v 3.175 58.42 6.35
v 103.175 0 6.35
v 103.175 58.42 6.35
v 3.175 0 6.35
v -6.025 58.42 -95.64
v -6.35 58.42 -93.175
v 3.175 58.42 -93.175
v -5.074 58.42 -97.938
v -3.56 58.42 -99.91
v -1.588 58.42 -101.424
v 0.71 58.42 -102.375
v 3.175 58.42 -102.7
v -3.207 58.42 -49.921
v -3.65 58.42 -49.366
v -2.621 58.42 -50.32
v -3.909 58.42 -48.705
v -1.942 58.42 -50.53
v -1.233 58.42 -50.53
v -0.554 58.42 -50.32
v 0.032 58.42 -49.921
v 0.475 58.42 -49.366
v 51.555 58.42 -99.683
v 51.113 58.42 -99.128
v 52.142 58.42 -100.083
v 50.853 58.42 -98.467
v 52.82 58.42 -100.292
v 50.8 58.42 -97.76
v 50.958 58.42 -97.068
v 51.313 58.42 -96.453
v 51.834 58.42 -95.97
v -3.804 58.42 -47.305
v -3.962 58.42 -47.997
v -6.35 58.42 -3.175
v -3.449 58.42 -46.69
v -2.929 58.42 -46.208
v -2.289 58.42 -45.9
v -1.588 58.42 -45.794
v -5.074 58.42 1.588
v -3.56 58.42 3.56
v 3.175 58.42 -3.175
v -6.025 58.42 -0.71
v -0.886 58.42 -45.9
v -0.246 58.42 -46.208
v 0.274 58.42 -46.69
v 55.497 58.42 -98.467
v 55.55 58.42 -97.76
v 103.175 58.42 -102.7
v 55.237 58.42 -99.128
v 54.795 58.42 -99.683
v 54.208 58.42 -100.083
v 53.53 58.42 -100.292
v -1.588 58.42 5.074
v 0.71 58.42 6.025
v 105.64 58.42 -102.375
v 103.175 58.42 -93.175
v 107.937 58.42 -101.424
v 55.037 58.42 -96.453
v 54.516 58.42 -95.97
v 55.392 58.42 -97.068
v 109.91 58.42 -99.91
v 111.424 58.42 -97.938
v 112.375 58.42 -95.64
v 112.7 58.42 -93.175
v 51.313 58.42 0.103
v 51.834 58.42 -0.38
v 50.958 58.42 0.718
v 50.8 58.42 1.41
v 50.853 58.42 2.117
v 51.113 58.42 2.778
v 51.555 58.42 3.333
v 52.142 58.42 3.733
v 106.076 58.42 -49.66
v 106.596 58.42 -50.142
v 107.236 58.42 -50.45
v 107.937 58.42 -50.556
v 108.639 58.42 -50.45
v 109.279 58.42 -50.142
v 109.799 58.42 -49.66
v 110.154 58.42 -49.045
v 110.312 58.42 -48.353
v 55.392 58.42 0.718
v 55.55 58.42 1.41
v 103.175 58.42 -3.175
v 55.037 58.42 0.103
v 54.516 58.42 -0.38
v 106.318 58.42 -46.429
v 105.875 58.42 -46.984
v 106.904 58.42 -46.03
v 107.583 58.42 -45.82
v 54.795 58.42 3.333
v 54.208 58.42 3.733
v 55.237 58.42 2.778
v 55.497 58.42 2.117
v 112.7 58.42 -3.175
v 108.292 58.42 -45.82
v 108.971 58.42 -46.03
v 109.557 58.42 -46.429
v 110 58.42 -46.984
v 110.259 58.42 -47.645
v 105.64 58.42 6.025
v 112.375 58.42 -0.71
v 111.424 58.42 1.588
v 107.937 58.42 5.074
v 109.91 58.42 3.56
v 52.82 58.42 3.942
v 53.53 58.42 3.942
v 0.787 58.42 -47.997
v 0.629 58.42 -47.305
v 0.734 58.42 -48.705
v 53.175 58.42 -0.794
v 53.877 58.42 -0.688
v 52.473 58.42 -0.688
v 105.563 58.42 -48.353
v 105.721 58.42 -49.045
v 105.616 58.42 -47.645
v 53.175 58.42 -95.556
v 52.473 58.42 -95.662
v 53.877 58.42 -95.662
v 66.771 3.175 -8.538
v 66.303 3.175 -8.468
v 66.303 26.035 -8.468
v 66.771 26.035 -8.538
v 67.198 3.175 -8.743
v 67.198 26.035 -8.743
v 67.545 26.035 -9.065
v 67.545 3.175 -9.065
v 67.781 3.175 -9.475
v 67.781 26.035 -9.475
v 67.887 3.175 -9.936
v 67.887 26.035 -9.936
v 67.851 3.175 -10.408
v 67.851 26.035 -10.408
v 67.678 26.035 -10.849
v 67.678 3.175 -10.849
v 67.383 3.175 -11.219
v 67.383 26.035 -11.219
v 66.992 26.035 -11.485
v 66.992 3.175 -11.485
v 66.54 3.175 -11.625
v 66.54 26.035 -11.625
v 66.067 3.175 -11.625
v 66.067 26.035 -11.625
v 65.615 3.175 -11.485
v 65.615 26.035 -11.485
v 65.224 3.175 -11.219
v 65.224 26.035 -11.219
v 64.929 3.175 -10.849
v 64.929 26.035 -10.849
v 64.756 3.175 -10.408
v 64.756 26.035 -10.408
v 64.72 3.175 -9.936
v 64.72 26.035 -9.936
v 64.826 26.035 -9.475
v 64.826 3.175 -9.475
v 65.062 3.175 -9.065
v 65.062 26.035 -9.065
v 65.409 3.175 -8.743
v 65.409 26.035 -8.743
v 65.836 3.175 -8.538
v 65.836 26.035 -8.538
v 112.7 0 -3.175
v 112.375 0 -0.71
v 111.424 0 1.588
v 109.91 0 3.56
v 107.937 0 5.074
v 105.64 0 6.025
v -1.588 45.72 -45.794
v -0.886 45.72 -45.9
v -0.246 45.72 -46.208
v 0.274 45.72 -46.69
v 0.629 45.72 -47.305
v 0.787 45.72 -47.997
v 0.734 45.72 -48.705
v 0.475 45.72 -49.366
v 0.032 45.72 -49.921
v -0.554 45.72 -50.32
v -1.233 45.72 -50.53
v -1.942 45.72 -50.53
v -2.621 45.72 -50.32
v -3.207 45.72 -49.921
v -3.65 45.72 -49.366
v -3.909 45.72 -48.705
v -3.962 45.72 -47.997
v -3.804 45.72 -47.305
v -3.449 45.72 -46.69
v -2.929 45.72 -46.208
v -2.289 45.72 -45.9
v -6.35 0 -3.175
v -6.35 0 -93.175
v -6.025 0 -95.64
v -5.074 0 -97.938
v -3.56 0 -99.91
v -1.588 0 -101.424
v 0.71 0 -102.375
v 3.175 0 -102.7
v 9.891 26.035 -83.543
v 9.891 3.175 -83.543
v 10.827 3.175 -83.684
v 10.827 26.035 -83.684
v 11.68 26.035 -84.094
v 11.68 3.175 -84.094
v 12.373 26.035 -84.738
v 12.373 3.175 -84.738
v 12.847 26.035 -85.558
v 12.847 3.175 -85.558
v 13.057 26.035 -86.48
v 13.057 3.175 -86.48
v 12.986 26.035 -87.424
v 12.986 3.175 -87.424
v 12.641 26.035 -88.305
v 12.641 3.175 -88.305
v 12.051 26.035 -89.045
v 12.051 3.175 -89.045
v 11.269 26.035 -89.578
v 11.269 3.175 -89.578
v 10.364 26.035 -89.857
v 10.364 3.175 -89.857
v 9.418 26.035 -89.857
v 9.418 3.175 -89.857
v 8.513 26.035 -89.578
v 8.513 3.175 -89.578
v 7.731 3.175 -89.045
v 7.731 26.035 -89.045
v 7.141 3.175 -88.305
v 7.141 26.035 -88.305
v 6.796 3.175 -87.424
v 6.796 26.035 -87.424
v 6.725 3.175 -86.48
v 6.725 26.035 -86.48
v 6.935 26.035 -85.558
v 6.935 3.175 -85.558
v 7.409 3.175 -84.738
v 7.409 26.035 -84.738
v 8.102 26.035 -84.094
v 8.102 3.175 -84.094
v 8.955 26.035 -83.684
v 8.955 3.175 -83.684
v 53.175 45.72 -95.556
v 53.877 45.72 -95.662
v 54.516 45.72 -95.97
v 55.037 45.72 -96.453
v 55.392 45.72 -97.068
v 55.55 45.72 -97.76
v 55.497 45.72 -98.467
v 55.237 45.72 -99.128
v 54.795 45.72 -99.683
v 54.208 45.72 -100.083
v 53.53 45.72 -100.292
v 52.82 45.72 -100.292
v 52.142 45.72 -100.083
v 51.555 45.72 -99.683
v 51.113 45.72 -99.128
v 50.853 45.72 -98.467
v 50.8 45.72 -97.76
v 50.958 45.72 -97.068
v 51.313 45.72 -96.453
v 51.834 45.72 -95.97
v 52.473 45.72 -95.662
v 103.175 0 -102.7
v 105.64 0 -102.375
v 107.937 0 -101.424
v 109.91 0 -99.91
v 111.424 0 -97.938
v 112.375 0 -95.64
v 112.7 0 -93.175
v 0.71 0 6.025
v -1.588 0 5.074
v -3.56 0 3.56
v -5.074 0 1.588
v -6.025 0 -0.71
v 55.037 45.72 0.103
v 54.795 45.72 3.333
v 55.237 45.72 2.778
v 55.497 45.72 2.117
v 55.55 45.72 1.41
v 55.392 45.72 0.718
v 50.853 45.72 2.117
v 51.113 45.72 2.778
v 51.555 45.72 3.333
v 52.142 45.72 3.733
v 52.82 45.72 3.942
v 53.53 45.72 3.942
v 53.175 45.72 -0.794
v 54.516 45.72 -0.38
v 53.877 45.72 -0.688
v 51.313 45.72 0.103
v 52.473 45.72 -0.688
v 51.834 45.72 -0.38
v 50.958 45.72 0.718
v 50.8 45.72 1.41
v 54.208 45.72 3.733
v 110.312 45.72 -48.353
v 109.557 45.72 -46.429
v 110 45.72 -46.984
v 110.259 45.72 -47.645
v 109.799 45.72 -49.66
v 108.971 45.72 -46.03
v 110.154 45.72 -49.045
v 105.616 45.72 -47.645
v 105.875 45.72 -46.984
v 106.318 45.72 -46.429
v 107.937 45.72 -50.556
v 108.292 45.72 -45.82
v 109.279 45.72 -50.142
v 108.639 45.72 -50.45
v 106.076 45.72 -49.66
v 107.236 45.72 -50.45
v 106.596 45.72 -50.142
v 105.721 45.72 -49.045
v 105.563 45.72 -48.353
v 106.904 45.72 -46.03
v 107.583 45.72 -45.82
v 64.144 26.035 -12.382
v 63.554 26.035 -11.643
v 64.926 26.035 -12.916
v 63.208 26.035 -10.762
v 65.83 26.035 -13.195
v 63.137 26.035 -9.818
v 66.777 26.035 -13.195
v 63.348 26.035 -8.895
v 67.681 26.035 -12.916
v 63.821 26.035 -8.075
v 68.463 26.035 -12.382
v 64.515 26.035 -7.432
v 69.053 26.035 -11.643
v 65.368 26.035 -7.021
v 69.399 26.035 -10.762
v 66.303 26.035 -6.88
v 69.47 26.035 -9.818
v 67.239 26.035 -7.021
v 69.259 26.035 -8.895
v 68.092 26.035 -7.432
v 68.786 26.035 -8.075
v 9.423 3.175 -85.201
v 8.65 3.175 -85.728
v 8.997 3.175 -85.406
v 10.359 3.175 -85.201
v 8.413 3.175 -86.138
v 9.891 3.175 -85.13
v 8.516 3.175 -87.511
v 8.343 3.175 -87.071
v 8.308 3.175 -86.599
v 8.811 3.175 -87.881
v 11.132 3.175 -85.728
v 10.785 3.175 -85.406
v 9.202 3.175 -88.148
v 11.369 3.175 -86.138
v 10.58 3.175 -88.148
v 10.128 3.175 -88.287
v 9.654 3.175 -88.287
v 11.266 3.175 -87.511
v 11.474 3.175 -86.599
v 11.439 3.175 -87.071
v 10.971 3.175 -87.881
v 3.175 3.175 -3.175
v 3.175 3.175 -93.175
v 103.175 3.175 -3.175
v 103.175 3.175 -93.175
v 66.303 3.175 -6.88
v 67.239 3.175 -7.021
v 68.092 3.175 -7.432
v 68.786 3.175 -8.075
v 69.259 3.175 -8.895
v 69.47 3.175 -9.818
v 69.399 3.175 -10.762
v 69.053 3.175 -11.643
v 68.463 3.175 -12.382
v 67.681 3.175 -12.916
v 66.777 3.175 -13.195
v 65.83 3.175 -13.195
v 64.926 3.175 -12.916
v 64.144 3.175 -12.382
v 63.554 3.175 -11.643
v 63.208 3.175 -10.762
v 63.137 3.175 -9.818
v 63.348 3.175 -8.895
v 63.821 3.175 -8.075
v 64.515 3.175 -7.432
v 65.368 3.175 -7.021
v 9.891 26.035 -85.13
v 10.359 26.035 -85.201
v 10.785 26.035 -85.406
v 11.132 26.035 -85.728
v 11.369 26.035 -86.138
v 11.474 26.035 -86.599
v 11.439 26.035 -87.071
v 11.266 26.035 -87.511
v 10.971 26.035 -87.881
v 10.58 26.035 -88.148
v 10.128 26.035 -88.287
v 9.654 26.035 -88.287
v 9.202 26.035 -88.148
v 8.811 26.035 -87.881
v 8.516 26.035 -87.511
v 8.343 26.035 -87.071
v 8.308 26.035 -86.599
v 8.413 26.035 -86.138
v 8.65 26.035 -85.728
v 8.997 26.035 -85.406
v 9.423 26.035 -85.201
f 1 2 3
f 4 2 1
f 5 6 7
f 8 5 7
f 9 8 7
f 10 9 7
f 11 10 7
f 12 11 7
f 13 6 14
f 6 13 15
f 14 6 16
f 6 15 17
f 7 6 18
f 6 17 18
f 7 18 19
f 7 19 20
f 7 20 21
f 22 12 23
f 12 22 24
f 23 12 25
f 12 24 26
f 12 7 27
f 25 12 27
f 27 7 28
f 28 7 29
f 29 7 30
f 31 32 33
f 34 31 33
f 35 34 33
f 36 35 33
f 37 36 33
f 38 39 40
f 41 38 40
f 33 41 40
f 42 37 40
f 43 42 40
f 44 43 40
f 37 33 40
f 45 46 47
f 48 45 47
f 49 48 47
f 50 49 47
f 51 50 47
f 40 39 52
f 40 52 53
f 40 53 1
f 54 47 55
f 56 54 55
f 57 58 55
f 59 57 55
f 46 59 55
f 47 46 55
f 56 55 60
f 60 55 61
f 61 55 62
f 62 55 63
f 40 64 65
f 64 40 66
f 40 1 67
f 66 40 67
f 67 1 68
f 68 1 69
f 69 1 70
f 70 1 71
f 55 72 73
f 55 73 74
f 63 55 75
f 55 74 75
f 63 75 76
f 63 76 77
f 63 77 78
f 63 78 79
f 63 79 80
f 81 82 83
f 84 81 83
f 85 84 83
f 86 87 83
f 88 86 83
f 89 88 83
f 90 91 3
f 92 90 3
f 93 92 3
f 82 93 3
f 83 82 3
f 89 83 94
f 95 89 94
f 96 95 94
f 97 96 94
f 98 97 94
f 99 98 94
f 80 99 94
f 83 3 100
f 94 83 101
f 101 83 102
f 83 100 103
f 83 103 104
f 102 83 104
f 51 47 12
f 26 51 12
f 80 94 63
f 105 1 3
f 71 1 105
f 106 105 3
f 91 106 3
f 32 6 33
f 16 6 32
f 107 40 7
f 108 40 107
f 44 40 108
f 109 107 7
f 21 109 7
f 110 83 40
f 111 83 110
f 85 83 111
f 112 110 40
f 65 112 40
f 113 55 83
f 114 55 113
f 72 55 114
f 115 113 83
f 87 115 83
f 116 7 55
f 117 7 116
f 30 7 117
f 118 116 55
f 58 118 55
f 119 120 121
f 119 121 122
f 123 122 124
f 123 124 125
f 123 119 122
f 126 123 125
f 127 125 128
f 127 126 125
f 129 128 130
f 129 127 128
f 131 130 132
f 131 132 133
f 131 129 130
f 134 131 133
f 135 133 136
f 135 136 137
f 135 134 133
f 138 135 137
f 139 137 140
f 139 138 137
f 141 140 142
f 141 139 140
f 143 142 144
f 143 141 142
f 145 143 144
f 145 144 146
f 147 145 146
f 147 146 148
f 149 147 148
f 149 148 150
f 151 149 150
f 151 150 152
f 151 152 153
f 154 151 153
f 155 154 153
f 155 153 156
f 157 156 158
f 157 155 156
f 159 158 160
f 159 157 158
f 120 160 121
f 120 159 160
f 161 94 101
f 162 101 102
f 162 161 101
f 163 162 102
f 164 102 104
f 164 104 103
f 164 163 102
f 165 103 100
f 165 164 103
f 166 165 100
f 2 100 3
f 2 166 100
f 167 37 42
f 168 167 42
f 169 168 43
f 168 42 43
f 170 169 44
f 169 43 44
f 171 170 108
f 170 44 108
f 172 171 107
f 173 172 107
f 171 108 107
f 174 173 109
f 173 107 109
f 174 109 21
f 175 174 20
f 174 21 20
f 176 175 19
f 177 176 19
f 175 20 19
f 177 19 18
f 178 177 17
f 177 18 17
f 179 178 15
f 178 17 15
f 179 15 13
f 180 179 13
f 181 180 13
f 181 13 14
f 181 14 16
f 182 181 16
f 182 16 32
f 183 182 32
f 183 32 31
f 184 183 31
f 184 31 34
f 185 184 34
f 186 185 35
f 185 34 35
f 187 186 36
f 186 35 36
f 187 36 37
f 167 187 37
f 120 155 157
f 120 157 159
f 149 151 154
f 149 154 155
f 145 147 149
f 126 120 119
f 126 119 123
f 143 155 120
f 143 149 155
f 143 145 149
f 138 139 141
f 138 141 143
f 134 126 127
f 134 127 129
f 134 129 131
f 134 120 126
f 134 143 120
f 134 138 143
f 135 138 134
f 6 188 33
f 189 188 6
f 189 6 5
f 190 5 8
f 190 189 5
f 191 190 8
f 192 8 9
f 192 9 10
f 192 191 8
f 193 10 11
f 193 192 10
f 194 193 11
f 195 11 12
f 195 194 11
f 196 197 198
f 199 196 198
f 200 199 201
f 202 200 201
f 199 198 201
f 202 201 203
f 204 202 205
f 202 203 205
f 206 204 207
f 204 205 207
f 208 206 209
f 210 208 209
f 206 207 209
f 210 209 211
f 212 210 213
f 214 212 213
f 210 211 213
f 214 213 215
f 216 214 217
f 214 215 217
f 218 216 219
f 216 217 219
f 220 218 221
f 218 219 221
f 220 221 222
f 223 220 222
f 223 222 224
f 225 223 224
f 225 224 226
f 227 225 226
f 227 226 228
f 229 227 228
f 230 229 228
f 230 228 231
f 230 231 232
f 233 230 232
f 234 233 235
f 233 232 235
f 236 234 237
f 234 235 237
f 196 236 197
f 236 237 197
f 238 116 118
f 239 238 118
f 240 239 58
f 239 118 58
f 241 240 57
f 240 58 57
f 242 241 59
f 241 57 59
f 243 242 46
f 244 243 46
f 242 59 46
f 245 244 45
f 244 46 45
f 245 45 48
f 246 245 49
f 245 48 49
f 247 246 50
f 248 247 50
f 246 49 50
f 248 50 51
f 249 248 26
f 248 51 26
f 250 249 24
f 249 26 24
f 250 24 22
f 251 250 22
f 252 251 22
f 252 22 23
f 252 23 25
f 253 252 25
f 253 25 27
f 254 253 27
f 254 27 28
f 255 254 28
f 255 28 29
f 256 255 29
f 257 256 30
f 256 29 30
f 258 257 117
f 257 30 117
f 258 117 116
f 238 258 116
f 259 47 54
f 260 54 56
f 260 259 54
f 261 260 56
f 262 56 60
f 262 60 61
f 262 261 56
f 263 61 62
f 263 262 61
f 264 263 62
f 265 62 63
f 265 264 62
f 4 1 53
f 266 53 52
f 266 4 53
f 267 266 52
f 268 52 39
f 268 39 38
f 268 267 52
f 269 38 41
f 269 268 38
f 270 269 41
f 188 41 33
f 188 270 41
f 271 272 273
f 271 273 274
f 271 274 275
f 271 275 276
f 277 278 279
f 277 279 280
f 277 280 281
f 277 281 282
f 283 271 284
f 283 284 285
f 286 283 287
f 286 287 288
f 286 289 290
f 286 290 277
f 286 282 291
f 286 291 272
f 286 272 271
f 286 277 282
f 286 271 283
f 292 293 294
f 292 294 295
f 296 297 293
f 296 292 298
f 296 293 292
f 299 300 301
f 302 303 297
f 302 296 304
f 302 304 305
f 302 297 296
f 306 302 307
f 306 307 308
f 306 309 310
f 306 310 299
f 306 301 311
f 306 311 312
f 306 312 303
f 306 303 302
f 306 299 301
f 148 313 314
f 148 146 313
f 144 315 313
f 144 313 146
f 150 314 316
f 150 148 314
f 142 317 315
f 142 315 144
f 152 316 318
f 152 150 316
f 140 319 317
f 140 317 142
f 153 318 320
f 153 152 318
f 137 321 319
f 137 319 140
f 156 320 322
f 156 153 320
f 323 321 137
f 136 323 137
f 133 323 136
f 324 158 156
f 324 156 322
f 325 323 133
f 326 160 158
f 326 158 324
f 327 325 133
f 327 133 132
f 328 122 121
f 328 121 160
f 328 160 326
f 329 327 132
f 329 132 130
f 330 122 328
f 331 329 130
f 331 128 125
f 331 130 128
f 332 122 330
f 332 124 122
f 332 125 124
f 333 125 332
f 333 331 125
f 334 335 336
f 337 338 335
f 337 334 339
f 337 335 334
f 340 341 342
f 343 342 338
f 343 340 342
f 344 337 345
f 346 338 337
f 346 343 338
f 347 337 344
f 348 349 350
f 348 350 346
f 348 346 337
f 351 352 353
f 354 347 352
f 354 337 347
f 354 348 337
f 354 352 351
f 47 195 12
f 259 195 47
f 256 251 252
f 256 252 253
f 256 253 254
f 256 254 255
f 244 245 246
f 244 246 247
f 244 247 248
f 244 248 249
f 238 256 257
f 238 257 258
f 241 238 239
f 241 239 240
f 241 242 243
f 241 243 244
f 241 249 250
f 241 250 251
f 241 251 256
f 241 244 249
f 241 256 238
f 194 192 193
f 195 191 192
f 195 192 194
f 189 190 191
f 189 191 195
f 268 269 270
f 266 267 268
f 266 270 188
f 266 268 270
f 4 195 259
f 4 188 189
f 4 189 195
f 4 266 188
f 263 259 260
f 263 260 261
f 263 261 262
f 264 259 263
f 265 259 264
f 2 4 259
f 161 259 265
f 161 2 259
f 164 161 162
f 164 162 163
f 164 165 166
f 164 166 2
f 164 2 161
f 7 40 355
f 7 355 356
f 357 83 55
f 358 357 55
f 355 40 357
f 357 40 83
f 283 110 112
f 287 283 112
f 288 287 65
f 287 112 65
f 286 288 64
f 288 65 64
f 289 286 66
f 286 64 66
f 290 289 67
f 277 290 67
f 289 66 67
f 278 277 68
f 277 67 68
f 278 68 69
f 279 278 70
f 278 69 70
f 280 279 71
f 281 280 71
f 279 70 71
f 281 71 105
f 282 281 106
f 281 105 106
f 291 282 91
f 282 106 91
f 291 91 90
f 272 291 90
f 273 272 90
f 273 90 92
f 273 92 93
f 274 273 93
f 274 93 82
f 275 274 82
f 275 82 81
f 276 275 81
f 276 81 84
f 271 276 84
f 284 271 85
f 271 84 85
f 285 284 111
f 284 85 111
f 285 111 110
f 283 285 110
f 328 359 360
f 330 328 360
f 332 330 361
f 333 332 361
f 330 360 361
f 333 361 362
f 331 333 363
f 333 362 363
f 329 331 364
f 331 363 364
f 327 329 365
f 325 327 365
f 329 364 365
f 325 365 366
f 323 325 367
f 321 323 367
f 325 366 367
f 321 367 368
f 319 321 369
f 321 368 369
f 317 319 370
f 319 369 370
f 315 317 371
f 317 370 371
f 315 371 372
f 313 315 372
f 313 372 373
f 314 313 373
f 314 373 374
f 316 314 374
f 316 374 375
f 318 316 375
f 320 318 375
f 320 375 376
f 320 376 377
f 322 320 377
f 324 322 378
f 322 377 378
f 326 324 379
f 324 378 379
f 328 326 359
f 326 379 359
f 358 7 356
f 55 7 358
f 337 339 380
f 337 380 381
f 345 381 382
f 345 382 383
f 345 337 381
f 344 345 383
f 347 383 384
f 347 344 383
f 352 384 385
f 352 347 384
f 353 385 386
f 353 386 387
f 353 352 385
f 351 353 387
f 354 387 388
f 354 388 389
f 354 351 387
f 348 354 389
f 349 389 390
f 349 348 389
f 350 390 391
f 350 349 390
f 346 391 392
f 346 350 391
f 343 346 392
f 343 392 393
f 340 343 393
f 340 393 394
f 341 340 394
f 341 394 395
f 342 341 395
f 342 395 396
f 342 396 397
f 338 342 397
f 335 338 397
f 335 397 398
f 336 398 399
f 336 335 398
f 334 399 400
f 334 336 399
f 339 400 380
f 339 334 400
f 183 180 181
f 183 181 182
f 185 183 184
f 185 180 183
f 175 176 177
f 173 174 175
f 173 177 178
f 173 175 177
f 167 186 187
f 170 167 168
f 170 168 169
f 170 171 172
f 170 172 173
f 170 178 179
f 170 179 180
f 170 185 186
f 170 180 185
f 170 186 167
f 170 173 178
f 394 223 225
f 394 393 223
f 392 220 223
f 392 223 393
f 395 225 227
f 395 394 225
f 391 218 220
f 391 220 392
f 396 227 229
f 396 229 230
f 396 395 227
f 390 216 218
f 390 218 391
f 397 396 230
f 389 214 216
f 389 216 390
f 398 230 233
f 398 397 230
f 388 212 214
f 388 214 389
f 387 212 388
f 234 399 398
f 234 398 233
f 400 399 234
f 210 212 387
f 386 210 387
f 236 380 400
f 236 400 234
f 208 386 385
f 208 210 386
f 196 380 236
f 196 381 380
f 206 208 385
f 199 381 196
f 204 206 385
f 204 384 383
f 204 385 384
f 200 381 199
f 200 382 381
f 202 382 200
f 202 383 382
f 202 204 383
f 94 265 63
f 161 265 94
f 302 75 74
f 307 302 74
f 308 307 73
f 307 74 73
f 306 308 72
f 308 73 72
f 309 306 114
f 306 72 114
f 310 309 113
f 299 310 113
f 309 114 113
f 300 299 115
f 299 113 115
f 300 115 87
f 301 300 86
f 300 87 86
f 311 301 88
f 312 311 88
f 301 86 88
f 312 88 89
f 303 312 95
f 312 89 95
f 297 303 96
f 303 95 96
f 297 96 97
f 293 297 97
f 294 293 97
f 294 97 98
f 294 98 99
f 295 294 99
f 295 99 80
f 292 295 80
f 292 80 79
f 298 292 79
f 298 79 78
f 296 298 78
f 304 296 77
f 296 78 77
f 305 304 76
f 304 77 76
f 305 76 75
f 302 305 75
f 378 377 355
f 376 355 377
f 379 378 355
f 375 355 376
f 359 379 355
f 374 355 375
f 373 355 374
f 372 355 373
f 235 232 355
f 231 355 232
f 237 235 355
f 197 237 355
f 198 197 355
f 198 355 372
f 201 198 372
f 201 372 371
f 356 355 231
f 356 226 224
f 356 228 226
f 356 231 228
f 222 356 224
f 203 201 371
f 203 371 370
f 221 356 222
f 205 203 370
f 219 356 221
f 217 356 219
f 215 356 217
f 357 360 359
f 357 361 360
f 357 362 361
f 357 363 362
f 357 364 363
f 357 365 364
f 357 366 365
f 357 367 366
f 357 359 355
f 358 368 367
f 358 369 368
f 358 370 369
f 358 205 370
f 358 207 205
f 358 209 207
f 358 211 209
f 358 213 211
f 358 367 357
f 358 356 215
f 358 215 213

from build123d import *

# Parameters (mm, degrees)
BOSS_EXTRUDE1_DEPTH = 58.42
SKETCH3_W           = 99.999999898
SKETCH3_H           = 90.000000086
CUT_EXTRUDE1_DEPTH  = 55.245
SKETCH5_R           = 3.175
SKETCH5_R_2         = 1.5875
BOSS_EXTRUDE2_DEPTH = 22.86
BOSS_EXTRUDE3_DEPTH = 58.42
SKETCH8_R           = 2.38125
CUT_EXTRUDE2_DEPTH  = 12.7


with BuildPart() as part:
    # Sketch1 → Boss-Extrude1 (new body)
    with BuildSketch(Plane(origin=(0, 0, 0), x_dir=(1, 0, 0), z_dir=(0, 1, 0))):
        with BuildLine():
            Line((3.175, 0), (103.174999898, 0))
            ThreePointArc((103.174999898, 0), (105.420063928, 0.92993597), (106.349999898, 3.175))
            Line((106.349999898, 3.175), (106.349999898, 93.175000086))
            ThreePointArc((106.349999898, 93.175000086), (105.420063928, 95.420064116), (103.174999898, 96.350000086))
            Line((103.174999898, 96.350000086), (3.175, 96.350000086))
            ThreePointArc((3.175, 96.350000086), (0.92993597, 95.420064116), (0, 93.175000086))
            Line((0, 93.175000086), (0, 3.175))
            ThreePointArc((0, 3.175), (0.92993597, 0.92993597), (3.175, 0))
        make_face()
    extrude(amount=BOSS_EXTRUDE1_DEPTH)

    # Sketch3 → Cut-Extrude1 (cut)
    with BuildSketch(Plane(origin=(0, 58.42, 0), x_dir=(1, 0, 0), z_dir=(0, 1, 0))):
        with Locations((53.174999949, 48.175000043)):
            Rectangle(SKETCH3_W, SKETCH3_H)
    extrude(amount=-CUT_EXTRUDE1_DEPTH, mode=Mode.SUBTRACT)

    # Sketch5 → Boss-Extrude2 (add)
    # profile 1 of 2: a face of its own
    with BuildSketch(Plane(origin=(0, 3.175, 0), x_dir=(1, 0, 0), z_dir=(0, 1, 0))):
        with Locations(Location((66.303499949, 10.055000043, 0), (0, 0, 270))):
            Circle(SKETCH5_R)
        with Locations(Location((66.303499949, 10.055000043, 0), (0, 0, 270))):
            Circle(SKETCH5_R_2, mode=Mode.SUBTRACT)
    # profile 2 of 2: a face of its own
    with BuildSketch(Plane(origin=(0, 3.175, 0), x_dir=(1, 0, 0), z_dir=(0, 1, 0))):
        with Locations(Location((9.890999949, 86.717500043, 0), (0, 0, 270))):
            Circle(SKETCH5_R)
        with Locations(Location((9.890999949, 86.717500043, 0), (0, 0, 270))):
            Circle(SKETCH5_R_2, mode=Mode.SUBTRACT)
    extrude(amount=BOSS_EXTRUDE2_DEPTH)

    # Sketch7 → Boss-Extrude3 (add)
    with BuildSketch(Plane.XZ):
        with BuildLine():
            Line((3.175, -102.700000086), (103.174999898, -102.700000086))
            ThreePointArc((103.174999898, -102.700000086), (109.910191989, -99.910192177), (112.699999898, -93.175000086))
            Line((112.699999898, -93.175000086), (112.699999898, -3.175))
            ThreePointArc((112.699999898, -3.175), (109.910191989, 3.560192091), (103.174999898, 6.35))
            Line((103.174999898, 6.35), (3.175, 6.35))
            ThreePointArc((3.175, 6.35), (-3.560192091, 3.560192091), (-6.35, -3.175))
            Line((-6.35, -3.175), (-6.35, -93.175000086))
            ThreePointArc((-6.35, -93.175000086), (-3.560192091, -99.910192177), (3.175, -102.700000086))
        make_face()
        with BuildLine():
            Line((3.175, -96.350000086), (103.174999898, -96.350000086))
            ThreePointArc((103.174999898, -96.350000086), (105.420063928, -95.420064116), (106.349999898, -93.175000086))
            Line((106.349999898, -93.175000086), (106.349999898, -3.175))
            ThreePointArc((106.349999898, -3.175), (105.420063928, -0.92993597), (103.174999898, 0))
            Line((103.174999898, 0), (3.175, 0))
            ThreePointArc((3.175, 0), (0.92993597, -0.92993597), (0, -3.175))
            Line((0, -3.175), (0, -93.175000086))
            ThreePointArc((0, -93.175000086), (0.92993597, -95.420064116), (3.175, -96.350000086))
        make_face(mode=Mode.SUBTRACT)
    extrude(amount=-BOSS_EXTRUDE3_DEPTH)

    # Sketch8 → Cut-Extrude2 (cut)
    with BuildSketch(Plane(origin=(0, 58.42, 0), x_dir=(1, 0, 0), z_dir=(0, 1, 0))):
        with Locations(Location((-1.5875, 48.175000043, 0), (0, 0, 270))):
            Circle(SKETCH8_R)
        with Locations(Location((53.174999949, 97.937500086, 0), (0, 0, 270))):
            Circle(SKETCH8_R)
        with Locations(Location((107.937499898, 48.175000043, 0), (0, 0, 90))):
            Circle(SKETCH8_R)
        with Locations(Location((53.174999949, -1.5875, 0), (0, 0, 90))):
            Circle(SKETCH8_R)
    extrude(amount=-CUT_EXTRUDE2_DEPTH, mode=Mode.SUBTRACT)


solid = part.part
